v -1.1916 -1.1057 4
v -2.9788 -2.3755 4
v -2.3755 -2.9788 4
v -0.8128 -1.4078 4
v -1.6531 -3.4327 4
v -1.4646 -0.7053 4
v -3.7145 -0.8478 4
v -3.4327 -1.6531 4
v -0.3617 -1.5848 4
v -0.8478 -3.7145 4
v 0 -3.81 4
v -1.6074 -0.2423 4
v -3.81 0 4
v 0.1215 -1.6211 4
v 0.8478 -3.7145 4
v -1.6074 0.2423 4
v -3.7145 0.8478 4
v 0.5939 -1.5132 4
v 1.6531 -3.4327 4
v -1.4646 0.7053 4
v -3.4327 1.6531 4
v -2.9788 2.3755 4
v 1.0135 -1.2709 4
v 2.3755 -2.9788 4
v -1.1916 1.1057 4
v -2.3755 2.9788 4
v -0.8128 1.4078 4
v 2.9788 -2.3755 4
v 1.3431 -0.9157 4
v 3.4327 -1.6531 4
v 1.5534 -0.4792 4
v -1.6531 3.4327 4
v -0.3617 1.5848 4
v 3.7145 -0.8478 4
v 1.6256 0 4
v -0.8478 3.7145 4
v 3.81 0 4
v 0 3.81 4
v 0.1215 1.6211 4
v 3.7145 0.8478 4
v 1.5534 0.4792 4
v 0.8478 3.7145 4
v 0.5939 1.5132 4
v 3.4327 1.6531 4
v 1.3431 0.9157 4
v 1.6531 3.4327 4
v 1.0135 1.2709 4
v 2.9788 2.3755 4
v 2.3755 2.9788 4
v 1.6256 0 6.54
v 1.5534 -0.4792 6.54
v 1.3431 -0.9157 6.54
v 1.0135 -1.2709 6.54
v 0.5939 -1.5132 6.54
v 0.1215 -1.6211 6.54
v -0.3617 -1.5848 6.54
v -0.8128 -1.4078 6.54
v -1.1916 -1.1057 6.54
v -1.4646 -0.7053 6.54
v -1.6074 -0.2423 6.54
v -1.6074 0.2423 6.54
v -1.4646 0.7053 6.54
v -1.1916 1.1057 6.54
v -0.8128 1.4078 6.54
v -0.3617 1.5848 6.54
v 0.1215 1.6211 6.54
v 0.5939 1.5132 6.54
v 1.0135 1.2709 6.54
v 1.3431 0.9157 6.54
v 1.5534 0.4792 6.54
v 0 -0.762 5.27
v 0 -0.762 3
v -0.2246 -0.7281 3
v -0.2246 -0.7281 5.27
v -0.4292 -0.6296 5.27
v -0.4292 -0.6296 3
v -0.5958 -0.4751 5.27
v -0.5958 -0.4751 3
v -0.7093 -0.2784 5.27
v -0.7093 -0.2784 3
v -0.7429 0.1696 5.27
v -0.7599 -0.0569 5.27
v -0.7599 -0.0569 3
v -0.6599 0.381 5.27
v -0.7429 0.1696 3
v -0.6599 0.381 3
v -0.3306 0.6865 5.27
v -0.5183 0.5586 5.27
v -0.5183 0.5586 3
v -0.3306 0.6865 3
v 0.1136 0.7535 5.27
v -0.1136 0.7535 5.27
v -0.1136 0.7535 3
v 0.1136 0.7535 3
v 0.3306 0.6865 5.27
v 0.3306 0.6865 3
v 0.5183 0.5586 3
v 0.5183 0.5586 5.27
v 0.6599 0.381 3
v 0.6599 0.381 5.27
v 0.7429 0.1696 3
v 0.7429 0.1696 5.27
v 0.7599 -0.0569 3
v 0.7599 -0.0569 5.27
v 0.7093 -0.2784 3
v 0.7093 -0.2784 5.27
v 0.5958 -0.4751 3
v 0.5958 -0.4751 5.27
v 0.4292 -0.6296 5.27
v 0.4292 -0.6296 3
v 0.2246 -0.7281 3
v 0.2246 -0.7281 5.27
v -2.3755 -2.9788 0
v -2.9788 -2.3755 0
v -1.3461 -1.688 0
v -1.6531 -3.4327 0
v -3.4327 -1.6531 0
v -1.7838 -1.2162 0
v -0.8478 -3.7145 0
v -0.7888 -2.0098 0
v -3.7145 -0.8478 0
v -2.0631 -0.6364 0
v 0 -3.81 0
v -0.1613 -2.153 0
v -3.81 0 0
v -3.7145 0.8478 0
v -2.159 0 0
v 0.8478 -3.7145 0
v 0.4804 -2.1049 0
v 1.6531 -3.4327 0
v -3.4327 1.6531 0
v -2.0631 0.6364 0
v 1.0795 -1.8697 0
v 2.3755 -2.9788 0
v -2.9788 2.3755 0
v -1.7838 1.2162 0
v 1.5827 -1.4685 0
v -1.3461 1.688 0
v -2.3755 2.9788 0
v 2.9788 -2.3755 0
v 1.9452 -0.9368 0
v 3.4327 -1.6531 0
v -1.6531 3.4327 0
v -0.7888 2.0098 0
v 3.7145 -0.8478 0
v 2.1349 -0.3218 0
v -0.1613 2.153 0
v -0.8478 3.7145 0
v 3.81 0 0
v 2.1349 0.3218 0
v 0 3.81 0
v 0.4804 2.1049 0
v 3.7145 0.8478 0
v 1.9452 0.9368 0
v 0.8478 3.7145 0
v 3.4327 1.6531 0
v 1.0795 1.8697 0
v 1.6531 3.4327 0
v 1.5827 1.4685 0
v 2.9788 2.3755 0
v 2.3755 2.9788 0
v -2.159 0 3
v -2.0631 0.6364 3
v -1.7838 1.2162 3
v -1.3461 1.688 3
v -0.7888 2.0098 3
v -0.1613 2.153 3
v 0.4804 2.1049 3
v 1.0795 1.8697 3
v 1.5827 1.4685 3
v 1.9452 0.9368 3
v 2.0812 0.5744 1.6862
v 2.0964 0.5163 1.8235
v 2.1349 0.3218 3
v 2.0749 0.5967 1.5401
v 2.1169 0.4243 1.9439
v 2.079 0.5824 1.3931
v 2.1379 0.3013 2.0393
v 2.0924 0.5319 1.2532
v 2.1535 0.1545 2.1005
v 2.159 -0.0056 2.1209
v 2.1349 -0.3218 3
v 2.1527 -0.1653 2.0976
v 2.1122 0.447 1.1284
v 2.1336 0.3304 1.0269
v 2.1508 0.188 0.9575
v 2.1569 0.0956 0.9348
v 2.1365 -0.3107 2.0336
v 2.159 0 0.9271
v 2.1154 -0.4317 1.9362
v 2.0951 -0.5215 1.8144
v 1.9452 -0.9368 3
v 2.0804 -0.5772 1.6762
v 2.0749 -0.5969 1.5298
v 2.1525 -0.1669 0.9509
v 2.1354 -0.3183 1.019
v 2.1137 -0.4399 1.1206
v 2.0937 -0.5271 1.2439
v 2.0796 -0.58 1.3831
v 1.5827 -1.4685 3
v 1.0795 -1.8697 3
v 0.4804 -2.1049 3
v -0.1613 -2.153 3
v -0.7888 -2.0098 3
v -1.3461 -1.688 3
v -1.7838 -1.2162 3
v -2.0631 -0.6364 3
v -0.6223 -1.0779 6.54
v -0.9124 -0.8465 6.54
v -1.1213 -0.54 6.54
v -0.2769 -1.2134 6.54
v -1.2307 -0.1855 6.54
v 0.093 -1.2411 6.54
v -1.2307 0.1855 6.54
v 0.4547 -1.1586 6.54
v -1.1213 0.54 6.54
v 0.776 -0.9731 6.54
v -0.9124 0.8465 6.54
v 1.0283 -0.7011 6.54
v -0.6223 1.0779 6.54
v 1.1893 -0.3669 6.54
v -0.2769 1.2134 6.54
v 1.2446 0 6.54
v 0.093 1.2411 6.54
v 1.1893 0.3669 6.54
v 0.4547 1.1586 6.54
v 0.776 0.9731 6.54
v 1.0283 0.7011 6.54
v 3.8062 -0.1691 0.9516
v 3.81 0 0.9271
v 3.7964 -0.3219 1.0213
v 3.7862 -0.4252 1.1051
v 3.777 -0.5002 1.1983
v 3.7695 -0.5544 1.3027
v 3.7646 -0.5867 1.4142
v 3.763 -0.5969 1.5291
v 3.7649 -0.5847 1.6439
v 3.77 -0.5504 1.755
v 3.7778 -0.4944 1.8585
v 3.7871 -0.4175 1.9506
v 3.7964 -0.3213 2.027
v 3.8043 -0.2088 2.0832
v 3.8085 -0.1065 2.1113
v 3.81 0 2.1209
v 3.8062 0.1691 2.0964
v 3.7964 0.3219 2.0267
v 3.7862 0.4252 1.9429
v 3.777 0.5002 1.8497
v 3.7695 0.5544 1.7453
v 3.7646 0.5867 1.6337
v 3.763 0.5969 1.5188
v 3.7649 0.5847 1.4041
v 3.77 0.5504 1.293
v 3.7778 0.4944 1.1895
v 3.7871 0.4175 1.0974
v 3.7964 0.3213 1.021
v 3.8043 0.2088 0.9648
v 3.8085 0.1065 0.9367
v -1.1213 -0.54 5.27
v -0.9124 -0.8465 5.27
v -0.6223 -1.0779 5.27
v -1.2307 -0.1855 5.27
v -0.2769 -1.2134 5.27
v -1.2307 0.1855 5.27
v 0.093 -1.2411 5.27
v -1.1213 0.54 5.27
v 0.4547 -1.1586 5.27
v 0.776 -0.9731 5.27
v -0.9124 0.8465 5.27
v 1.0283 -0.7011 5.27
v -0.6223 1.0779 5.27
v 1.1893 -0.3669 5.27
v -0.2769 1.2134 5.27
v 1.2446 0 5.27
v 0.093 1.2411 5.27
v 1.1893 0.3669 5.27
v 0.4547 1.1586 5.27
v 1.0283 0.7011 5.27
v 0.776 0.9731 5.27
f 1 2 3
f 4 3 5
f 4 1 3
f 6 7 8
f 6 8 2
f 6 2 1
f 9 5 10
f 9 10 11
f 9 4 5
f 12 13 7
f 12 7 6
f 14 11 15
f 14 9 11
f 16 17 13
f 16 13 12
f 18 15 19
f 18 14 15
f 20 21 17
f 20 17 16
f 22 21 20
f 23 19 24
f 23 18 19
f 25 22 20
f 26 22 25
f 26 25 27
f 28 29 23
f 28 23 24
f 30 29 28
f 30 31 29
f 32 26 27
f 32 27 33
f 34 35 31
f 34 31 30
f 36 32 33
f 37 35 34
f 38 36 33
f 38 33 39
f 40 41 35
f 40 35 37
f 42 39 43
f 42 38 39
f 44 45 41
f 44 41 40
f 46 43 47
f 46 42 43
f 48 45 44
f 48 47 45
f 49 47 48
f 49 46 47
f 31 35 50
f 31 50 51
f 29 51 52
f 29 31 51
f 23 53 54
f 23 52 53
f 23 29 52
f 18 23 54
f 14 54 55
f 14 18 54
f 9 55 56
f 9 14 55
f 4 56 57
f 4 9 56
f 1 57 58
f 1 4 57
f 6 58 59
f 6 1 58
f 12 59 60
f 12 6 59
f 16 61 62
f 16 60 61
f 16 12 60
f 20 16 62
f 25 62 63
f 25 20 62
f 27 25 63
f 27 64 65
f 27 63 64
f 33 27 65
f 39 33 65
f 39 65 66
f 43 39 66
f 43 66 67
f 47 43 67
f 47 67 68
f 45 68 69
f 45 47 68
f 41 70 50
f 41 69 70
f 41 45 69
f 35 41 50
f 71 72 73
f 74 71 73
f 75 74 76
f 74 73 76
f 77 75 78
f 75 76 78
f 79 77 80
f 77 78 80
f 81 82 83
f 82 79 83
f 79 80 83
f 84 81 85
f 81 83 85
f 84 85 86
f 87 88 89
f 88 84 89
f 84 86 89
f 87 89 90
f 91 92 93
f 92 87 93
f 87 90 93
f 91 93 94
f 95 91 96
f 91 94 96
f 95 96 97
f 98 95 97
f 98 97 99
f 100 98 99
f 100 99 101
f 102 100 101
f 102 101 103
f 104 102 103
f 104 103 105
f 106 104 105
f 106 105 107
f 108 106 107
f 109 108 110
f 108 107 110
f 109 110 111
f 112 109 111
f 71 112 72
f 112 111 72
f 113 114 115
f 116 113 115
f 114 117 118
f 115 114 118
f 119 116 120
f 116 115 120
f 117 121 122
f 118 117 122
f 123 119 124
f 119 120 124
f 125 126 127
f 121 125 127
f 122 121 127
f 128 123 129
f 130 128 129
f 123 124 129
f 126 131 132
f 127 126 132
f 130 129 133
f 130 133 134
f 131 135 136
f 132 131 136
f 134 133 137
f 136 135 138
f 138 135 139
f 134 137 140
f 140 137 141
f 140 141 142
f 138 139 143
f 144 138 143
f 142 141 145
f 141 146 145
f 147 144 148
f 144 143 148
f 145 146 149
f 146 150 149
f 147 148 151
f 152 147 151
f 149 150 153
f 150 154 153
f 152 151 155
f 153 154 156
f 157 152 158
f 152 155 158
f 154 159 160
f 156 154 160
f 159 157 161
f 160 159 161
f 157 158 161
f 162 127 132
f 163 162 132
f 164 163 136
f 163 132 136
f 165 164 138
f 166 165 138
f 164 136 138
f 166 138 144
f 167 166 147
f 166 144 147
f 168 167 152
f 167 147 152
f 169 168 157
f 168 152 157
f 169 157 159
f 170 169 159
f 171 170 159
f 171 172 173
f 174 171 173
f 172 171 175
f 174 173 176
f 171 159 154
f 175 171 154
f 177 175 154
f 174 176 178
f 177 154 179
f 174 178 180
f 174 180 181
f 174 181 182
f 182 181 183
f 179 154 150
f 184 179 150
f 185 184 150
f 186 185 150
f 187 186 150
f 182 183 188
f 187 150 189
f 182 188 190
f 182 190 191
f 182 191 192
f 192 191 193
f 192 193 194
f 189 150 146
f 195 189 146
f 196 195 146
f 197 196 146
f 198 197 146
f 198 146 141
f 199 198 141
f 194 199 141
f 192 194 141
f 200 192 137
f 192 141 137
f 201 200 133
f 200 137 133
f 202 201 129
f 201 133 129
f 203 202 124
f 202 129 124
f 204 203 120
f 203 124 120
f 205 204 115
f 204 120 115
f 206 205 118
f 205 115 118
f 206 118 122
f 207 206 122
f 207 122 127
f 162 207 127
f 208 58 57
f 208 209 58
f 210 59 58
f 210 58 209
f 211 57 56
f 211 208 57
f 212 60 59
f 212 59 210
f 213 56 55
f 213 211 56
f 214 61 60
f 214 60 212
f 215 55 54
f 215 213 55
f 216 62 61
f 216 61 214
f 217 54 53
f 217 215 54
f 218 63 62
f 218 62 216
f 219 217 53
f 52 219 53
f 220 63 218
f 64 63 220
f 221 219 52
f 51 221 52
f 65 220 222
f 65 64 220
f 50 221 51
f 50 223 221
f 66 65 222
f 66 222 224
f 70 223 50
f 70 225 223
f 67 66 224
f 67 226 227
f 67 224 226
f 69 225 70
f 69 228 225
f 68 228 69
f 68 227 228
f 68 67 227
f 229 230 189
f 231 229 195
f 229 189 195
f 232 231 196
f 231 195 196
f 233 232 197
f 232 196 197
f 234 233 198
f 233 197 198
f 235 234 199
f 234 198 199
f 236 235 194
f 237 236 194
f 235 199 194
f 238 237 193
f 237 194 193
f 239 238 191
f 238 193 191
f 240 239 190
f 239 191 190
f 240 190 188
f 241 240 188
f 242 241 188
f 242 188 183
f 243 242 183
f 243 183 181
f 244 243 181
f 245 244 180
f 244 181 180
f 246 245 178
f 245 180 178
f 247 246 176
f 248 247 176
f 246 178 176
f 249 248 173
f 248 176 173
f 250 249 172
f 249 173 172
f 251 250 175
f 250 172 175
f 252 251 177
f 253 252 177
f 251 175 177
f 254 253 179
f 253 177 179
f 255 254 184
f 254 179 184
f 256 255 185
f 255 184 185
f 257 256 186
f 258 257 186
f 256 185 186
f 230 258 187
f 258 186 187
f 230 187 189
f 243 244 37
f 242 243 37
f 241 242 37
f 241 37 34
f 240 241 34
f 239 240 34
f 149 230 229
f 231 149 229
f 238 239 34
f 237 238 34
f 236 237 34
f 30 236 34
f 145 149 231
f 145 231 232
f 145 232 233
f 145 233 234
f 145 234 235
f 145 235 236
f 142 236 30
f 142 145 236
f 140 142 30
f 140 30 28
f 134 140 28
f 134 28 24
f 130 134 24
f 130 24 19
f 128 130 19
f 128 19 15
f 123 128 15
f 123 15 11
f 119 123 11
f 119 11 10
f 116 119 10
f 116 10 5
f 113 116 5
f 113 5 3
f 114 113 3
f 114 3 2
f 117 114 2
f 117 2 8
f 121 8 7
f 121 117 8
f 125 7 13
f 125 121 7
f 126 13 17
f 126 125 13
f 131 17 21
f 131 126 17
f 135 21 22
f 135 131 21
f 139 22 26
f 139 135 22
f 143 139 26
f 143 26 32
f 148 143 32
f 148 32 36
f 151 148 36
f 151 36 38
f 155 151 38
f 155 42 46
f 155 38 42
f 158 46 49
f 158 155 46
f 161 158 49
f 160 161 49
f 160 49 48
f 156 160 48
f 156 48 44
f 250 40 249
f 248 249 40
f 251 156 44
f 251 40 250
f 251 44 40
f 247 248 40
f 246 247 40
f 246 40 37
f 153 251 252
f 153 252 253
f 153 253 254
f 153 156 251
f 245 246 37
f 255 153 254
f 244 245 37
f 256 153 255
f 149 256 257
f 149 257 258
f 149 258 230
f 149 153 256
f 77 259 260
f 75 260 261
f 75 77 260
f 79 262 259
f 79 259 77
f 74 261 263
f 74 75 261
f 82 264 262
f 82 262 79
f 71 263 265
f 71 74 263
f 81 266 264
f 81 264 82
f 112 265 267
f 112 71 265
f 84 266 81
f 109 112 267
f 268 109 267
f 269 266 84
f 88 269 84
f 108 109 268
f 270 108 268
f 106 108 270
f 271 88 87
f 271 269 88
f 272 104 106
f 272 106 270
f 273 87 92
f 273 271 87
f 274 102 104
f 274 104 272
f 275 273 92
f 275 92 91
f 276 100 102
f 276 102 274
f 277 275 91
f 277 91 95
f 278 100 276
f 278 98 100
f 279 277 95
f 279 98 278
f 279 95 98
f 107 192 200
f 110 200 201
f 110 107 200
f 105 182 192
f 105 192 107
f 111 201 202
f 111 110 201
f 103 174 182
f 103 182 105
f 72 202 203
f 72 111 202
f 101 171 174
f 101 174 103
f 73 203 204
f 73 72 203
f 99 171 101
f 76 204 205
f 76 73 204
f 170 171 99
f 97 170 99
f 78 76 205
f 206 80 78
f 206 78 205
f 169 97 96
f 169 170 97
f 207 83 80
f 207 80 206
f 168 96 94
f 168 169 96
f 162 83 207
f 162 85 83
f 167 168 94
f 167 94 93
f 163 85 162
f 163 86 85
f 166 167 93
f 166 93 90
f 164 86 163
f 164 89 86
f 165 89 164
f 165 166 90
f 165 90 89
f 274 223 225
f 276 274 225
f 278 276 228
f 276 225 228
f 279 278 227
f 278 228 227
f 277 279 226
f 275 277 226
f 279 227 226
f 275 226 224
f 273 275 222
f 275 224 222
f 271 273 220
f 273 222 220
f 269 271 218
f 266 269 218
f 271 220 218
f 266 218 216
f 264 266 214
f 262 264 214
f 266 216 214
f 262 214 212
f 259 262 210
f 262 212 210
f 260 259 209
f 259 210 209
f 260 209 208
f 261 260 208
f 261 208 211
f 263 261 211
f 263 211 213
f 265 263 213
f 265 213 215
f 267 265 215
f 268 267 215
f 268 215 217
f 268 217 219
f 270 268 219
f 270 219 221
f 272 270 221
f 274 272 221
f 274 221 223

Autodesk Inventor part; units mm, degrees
ref_plane "XZ Plane" through (0, 0, 0) normal (0, 1, 0) x (-1, 0, 0)
ref_plane "XY Plane" through (0, 0, 0) normal (0, 0, 1) x (1, 0, 0)
sketch "Sketch1" plane through (0, 0, 0) normal (0, 0, 1) x (1, 0, 0)
  circle A0 centre (0, 0) radius 3.81
  dimension "d0" = 7.62
extrude "Extrusion1" add sketch "Sketch1" along normal blind 4
sketch "Sketch2" plane through (0, 0, 4) normal (0, 0, 1) x (1, 0, 0)
  circle A0 centre (0, 0) radius 3.81 projected
  circle A1 centre (0, 0) radius 1.6256
  dimension "d3" = 3.2512
extrude "Extrusion2" add sketch "Sketch2" along normal blind 2.54 contours A1
sketch "Sketch3" plane through (0, 0, 6.54) normal (0, 0, 1) x (1, 0, 0)
  circle A0 centre (0, 0) radius 1.6256 projected
hole "Hole1" at (0, 0, 6.54) direction (0, 0, -1) diameter 1.524 end through all
sketch "Sketch4" plane through (0, 0, 0) normal (0, 0, -1) x (-1, 0, 0)
  circle A0 centre (0, 0) radius 0.762 projected
  circle A1 centre (0, 0) radius 3.81 projected
  circle A2 centre (0, 0) radius 2.159
  dimension "d15" = 4.318
extrude "Extrusion3" cut sketch "Sketch4" against normal blind 3 contours A2
ref_plane "Work Plane1" through (3.81, 0, 0) normal (1, 0, 0) x (0, 1, 0)
sketch "Sketch5" plane through (3.81, 0, 0) normal (1, 0, 0) x (0, 1, 0)
  line L0 (-3.81, 4) -> (3.81, 4) projected
  line L1 (-3.81, 0) -> (3.81, 0) projected
  line L2 (0, -1.2) -> (0, 7.2) projected
  line L3 (-2.159, 3) -> (2.159, 3) projected
  point P0 (0, 0)
  point P1 (0, 1.524)
  dimension "d16" = 3
  dimension "d17" = 1.524
hole "Hole2" at (3.81, 0, 1.524) direction (-1, 0, 0) diameter 1.1938 end up to surface
sketch "Sketch6" plane through (0, 0, 6.54) normal (0, 0, 1) x (1, 0, 0)
  circle A0 centre (0, 0) radius 0.762 projected
  circle A1 centre (0, 0) radius 1.6256 projected
  circle A2 centre (0, 0) radius 1.2446
  dimension "d25" = 2.4892
extrude "Extrusion4" cut sketch "Sketch6" against normal blind 1.27 contours A2
properties part number "bottom_cap"
